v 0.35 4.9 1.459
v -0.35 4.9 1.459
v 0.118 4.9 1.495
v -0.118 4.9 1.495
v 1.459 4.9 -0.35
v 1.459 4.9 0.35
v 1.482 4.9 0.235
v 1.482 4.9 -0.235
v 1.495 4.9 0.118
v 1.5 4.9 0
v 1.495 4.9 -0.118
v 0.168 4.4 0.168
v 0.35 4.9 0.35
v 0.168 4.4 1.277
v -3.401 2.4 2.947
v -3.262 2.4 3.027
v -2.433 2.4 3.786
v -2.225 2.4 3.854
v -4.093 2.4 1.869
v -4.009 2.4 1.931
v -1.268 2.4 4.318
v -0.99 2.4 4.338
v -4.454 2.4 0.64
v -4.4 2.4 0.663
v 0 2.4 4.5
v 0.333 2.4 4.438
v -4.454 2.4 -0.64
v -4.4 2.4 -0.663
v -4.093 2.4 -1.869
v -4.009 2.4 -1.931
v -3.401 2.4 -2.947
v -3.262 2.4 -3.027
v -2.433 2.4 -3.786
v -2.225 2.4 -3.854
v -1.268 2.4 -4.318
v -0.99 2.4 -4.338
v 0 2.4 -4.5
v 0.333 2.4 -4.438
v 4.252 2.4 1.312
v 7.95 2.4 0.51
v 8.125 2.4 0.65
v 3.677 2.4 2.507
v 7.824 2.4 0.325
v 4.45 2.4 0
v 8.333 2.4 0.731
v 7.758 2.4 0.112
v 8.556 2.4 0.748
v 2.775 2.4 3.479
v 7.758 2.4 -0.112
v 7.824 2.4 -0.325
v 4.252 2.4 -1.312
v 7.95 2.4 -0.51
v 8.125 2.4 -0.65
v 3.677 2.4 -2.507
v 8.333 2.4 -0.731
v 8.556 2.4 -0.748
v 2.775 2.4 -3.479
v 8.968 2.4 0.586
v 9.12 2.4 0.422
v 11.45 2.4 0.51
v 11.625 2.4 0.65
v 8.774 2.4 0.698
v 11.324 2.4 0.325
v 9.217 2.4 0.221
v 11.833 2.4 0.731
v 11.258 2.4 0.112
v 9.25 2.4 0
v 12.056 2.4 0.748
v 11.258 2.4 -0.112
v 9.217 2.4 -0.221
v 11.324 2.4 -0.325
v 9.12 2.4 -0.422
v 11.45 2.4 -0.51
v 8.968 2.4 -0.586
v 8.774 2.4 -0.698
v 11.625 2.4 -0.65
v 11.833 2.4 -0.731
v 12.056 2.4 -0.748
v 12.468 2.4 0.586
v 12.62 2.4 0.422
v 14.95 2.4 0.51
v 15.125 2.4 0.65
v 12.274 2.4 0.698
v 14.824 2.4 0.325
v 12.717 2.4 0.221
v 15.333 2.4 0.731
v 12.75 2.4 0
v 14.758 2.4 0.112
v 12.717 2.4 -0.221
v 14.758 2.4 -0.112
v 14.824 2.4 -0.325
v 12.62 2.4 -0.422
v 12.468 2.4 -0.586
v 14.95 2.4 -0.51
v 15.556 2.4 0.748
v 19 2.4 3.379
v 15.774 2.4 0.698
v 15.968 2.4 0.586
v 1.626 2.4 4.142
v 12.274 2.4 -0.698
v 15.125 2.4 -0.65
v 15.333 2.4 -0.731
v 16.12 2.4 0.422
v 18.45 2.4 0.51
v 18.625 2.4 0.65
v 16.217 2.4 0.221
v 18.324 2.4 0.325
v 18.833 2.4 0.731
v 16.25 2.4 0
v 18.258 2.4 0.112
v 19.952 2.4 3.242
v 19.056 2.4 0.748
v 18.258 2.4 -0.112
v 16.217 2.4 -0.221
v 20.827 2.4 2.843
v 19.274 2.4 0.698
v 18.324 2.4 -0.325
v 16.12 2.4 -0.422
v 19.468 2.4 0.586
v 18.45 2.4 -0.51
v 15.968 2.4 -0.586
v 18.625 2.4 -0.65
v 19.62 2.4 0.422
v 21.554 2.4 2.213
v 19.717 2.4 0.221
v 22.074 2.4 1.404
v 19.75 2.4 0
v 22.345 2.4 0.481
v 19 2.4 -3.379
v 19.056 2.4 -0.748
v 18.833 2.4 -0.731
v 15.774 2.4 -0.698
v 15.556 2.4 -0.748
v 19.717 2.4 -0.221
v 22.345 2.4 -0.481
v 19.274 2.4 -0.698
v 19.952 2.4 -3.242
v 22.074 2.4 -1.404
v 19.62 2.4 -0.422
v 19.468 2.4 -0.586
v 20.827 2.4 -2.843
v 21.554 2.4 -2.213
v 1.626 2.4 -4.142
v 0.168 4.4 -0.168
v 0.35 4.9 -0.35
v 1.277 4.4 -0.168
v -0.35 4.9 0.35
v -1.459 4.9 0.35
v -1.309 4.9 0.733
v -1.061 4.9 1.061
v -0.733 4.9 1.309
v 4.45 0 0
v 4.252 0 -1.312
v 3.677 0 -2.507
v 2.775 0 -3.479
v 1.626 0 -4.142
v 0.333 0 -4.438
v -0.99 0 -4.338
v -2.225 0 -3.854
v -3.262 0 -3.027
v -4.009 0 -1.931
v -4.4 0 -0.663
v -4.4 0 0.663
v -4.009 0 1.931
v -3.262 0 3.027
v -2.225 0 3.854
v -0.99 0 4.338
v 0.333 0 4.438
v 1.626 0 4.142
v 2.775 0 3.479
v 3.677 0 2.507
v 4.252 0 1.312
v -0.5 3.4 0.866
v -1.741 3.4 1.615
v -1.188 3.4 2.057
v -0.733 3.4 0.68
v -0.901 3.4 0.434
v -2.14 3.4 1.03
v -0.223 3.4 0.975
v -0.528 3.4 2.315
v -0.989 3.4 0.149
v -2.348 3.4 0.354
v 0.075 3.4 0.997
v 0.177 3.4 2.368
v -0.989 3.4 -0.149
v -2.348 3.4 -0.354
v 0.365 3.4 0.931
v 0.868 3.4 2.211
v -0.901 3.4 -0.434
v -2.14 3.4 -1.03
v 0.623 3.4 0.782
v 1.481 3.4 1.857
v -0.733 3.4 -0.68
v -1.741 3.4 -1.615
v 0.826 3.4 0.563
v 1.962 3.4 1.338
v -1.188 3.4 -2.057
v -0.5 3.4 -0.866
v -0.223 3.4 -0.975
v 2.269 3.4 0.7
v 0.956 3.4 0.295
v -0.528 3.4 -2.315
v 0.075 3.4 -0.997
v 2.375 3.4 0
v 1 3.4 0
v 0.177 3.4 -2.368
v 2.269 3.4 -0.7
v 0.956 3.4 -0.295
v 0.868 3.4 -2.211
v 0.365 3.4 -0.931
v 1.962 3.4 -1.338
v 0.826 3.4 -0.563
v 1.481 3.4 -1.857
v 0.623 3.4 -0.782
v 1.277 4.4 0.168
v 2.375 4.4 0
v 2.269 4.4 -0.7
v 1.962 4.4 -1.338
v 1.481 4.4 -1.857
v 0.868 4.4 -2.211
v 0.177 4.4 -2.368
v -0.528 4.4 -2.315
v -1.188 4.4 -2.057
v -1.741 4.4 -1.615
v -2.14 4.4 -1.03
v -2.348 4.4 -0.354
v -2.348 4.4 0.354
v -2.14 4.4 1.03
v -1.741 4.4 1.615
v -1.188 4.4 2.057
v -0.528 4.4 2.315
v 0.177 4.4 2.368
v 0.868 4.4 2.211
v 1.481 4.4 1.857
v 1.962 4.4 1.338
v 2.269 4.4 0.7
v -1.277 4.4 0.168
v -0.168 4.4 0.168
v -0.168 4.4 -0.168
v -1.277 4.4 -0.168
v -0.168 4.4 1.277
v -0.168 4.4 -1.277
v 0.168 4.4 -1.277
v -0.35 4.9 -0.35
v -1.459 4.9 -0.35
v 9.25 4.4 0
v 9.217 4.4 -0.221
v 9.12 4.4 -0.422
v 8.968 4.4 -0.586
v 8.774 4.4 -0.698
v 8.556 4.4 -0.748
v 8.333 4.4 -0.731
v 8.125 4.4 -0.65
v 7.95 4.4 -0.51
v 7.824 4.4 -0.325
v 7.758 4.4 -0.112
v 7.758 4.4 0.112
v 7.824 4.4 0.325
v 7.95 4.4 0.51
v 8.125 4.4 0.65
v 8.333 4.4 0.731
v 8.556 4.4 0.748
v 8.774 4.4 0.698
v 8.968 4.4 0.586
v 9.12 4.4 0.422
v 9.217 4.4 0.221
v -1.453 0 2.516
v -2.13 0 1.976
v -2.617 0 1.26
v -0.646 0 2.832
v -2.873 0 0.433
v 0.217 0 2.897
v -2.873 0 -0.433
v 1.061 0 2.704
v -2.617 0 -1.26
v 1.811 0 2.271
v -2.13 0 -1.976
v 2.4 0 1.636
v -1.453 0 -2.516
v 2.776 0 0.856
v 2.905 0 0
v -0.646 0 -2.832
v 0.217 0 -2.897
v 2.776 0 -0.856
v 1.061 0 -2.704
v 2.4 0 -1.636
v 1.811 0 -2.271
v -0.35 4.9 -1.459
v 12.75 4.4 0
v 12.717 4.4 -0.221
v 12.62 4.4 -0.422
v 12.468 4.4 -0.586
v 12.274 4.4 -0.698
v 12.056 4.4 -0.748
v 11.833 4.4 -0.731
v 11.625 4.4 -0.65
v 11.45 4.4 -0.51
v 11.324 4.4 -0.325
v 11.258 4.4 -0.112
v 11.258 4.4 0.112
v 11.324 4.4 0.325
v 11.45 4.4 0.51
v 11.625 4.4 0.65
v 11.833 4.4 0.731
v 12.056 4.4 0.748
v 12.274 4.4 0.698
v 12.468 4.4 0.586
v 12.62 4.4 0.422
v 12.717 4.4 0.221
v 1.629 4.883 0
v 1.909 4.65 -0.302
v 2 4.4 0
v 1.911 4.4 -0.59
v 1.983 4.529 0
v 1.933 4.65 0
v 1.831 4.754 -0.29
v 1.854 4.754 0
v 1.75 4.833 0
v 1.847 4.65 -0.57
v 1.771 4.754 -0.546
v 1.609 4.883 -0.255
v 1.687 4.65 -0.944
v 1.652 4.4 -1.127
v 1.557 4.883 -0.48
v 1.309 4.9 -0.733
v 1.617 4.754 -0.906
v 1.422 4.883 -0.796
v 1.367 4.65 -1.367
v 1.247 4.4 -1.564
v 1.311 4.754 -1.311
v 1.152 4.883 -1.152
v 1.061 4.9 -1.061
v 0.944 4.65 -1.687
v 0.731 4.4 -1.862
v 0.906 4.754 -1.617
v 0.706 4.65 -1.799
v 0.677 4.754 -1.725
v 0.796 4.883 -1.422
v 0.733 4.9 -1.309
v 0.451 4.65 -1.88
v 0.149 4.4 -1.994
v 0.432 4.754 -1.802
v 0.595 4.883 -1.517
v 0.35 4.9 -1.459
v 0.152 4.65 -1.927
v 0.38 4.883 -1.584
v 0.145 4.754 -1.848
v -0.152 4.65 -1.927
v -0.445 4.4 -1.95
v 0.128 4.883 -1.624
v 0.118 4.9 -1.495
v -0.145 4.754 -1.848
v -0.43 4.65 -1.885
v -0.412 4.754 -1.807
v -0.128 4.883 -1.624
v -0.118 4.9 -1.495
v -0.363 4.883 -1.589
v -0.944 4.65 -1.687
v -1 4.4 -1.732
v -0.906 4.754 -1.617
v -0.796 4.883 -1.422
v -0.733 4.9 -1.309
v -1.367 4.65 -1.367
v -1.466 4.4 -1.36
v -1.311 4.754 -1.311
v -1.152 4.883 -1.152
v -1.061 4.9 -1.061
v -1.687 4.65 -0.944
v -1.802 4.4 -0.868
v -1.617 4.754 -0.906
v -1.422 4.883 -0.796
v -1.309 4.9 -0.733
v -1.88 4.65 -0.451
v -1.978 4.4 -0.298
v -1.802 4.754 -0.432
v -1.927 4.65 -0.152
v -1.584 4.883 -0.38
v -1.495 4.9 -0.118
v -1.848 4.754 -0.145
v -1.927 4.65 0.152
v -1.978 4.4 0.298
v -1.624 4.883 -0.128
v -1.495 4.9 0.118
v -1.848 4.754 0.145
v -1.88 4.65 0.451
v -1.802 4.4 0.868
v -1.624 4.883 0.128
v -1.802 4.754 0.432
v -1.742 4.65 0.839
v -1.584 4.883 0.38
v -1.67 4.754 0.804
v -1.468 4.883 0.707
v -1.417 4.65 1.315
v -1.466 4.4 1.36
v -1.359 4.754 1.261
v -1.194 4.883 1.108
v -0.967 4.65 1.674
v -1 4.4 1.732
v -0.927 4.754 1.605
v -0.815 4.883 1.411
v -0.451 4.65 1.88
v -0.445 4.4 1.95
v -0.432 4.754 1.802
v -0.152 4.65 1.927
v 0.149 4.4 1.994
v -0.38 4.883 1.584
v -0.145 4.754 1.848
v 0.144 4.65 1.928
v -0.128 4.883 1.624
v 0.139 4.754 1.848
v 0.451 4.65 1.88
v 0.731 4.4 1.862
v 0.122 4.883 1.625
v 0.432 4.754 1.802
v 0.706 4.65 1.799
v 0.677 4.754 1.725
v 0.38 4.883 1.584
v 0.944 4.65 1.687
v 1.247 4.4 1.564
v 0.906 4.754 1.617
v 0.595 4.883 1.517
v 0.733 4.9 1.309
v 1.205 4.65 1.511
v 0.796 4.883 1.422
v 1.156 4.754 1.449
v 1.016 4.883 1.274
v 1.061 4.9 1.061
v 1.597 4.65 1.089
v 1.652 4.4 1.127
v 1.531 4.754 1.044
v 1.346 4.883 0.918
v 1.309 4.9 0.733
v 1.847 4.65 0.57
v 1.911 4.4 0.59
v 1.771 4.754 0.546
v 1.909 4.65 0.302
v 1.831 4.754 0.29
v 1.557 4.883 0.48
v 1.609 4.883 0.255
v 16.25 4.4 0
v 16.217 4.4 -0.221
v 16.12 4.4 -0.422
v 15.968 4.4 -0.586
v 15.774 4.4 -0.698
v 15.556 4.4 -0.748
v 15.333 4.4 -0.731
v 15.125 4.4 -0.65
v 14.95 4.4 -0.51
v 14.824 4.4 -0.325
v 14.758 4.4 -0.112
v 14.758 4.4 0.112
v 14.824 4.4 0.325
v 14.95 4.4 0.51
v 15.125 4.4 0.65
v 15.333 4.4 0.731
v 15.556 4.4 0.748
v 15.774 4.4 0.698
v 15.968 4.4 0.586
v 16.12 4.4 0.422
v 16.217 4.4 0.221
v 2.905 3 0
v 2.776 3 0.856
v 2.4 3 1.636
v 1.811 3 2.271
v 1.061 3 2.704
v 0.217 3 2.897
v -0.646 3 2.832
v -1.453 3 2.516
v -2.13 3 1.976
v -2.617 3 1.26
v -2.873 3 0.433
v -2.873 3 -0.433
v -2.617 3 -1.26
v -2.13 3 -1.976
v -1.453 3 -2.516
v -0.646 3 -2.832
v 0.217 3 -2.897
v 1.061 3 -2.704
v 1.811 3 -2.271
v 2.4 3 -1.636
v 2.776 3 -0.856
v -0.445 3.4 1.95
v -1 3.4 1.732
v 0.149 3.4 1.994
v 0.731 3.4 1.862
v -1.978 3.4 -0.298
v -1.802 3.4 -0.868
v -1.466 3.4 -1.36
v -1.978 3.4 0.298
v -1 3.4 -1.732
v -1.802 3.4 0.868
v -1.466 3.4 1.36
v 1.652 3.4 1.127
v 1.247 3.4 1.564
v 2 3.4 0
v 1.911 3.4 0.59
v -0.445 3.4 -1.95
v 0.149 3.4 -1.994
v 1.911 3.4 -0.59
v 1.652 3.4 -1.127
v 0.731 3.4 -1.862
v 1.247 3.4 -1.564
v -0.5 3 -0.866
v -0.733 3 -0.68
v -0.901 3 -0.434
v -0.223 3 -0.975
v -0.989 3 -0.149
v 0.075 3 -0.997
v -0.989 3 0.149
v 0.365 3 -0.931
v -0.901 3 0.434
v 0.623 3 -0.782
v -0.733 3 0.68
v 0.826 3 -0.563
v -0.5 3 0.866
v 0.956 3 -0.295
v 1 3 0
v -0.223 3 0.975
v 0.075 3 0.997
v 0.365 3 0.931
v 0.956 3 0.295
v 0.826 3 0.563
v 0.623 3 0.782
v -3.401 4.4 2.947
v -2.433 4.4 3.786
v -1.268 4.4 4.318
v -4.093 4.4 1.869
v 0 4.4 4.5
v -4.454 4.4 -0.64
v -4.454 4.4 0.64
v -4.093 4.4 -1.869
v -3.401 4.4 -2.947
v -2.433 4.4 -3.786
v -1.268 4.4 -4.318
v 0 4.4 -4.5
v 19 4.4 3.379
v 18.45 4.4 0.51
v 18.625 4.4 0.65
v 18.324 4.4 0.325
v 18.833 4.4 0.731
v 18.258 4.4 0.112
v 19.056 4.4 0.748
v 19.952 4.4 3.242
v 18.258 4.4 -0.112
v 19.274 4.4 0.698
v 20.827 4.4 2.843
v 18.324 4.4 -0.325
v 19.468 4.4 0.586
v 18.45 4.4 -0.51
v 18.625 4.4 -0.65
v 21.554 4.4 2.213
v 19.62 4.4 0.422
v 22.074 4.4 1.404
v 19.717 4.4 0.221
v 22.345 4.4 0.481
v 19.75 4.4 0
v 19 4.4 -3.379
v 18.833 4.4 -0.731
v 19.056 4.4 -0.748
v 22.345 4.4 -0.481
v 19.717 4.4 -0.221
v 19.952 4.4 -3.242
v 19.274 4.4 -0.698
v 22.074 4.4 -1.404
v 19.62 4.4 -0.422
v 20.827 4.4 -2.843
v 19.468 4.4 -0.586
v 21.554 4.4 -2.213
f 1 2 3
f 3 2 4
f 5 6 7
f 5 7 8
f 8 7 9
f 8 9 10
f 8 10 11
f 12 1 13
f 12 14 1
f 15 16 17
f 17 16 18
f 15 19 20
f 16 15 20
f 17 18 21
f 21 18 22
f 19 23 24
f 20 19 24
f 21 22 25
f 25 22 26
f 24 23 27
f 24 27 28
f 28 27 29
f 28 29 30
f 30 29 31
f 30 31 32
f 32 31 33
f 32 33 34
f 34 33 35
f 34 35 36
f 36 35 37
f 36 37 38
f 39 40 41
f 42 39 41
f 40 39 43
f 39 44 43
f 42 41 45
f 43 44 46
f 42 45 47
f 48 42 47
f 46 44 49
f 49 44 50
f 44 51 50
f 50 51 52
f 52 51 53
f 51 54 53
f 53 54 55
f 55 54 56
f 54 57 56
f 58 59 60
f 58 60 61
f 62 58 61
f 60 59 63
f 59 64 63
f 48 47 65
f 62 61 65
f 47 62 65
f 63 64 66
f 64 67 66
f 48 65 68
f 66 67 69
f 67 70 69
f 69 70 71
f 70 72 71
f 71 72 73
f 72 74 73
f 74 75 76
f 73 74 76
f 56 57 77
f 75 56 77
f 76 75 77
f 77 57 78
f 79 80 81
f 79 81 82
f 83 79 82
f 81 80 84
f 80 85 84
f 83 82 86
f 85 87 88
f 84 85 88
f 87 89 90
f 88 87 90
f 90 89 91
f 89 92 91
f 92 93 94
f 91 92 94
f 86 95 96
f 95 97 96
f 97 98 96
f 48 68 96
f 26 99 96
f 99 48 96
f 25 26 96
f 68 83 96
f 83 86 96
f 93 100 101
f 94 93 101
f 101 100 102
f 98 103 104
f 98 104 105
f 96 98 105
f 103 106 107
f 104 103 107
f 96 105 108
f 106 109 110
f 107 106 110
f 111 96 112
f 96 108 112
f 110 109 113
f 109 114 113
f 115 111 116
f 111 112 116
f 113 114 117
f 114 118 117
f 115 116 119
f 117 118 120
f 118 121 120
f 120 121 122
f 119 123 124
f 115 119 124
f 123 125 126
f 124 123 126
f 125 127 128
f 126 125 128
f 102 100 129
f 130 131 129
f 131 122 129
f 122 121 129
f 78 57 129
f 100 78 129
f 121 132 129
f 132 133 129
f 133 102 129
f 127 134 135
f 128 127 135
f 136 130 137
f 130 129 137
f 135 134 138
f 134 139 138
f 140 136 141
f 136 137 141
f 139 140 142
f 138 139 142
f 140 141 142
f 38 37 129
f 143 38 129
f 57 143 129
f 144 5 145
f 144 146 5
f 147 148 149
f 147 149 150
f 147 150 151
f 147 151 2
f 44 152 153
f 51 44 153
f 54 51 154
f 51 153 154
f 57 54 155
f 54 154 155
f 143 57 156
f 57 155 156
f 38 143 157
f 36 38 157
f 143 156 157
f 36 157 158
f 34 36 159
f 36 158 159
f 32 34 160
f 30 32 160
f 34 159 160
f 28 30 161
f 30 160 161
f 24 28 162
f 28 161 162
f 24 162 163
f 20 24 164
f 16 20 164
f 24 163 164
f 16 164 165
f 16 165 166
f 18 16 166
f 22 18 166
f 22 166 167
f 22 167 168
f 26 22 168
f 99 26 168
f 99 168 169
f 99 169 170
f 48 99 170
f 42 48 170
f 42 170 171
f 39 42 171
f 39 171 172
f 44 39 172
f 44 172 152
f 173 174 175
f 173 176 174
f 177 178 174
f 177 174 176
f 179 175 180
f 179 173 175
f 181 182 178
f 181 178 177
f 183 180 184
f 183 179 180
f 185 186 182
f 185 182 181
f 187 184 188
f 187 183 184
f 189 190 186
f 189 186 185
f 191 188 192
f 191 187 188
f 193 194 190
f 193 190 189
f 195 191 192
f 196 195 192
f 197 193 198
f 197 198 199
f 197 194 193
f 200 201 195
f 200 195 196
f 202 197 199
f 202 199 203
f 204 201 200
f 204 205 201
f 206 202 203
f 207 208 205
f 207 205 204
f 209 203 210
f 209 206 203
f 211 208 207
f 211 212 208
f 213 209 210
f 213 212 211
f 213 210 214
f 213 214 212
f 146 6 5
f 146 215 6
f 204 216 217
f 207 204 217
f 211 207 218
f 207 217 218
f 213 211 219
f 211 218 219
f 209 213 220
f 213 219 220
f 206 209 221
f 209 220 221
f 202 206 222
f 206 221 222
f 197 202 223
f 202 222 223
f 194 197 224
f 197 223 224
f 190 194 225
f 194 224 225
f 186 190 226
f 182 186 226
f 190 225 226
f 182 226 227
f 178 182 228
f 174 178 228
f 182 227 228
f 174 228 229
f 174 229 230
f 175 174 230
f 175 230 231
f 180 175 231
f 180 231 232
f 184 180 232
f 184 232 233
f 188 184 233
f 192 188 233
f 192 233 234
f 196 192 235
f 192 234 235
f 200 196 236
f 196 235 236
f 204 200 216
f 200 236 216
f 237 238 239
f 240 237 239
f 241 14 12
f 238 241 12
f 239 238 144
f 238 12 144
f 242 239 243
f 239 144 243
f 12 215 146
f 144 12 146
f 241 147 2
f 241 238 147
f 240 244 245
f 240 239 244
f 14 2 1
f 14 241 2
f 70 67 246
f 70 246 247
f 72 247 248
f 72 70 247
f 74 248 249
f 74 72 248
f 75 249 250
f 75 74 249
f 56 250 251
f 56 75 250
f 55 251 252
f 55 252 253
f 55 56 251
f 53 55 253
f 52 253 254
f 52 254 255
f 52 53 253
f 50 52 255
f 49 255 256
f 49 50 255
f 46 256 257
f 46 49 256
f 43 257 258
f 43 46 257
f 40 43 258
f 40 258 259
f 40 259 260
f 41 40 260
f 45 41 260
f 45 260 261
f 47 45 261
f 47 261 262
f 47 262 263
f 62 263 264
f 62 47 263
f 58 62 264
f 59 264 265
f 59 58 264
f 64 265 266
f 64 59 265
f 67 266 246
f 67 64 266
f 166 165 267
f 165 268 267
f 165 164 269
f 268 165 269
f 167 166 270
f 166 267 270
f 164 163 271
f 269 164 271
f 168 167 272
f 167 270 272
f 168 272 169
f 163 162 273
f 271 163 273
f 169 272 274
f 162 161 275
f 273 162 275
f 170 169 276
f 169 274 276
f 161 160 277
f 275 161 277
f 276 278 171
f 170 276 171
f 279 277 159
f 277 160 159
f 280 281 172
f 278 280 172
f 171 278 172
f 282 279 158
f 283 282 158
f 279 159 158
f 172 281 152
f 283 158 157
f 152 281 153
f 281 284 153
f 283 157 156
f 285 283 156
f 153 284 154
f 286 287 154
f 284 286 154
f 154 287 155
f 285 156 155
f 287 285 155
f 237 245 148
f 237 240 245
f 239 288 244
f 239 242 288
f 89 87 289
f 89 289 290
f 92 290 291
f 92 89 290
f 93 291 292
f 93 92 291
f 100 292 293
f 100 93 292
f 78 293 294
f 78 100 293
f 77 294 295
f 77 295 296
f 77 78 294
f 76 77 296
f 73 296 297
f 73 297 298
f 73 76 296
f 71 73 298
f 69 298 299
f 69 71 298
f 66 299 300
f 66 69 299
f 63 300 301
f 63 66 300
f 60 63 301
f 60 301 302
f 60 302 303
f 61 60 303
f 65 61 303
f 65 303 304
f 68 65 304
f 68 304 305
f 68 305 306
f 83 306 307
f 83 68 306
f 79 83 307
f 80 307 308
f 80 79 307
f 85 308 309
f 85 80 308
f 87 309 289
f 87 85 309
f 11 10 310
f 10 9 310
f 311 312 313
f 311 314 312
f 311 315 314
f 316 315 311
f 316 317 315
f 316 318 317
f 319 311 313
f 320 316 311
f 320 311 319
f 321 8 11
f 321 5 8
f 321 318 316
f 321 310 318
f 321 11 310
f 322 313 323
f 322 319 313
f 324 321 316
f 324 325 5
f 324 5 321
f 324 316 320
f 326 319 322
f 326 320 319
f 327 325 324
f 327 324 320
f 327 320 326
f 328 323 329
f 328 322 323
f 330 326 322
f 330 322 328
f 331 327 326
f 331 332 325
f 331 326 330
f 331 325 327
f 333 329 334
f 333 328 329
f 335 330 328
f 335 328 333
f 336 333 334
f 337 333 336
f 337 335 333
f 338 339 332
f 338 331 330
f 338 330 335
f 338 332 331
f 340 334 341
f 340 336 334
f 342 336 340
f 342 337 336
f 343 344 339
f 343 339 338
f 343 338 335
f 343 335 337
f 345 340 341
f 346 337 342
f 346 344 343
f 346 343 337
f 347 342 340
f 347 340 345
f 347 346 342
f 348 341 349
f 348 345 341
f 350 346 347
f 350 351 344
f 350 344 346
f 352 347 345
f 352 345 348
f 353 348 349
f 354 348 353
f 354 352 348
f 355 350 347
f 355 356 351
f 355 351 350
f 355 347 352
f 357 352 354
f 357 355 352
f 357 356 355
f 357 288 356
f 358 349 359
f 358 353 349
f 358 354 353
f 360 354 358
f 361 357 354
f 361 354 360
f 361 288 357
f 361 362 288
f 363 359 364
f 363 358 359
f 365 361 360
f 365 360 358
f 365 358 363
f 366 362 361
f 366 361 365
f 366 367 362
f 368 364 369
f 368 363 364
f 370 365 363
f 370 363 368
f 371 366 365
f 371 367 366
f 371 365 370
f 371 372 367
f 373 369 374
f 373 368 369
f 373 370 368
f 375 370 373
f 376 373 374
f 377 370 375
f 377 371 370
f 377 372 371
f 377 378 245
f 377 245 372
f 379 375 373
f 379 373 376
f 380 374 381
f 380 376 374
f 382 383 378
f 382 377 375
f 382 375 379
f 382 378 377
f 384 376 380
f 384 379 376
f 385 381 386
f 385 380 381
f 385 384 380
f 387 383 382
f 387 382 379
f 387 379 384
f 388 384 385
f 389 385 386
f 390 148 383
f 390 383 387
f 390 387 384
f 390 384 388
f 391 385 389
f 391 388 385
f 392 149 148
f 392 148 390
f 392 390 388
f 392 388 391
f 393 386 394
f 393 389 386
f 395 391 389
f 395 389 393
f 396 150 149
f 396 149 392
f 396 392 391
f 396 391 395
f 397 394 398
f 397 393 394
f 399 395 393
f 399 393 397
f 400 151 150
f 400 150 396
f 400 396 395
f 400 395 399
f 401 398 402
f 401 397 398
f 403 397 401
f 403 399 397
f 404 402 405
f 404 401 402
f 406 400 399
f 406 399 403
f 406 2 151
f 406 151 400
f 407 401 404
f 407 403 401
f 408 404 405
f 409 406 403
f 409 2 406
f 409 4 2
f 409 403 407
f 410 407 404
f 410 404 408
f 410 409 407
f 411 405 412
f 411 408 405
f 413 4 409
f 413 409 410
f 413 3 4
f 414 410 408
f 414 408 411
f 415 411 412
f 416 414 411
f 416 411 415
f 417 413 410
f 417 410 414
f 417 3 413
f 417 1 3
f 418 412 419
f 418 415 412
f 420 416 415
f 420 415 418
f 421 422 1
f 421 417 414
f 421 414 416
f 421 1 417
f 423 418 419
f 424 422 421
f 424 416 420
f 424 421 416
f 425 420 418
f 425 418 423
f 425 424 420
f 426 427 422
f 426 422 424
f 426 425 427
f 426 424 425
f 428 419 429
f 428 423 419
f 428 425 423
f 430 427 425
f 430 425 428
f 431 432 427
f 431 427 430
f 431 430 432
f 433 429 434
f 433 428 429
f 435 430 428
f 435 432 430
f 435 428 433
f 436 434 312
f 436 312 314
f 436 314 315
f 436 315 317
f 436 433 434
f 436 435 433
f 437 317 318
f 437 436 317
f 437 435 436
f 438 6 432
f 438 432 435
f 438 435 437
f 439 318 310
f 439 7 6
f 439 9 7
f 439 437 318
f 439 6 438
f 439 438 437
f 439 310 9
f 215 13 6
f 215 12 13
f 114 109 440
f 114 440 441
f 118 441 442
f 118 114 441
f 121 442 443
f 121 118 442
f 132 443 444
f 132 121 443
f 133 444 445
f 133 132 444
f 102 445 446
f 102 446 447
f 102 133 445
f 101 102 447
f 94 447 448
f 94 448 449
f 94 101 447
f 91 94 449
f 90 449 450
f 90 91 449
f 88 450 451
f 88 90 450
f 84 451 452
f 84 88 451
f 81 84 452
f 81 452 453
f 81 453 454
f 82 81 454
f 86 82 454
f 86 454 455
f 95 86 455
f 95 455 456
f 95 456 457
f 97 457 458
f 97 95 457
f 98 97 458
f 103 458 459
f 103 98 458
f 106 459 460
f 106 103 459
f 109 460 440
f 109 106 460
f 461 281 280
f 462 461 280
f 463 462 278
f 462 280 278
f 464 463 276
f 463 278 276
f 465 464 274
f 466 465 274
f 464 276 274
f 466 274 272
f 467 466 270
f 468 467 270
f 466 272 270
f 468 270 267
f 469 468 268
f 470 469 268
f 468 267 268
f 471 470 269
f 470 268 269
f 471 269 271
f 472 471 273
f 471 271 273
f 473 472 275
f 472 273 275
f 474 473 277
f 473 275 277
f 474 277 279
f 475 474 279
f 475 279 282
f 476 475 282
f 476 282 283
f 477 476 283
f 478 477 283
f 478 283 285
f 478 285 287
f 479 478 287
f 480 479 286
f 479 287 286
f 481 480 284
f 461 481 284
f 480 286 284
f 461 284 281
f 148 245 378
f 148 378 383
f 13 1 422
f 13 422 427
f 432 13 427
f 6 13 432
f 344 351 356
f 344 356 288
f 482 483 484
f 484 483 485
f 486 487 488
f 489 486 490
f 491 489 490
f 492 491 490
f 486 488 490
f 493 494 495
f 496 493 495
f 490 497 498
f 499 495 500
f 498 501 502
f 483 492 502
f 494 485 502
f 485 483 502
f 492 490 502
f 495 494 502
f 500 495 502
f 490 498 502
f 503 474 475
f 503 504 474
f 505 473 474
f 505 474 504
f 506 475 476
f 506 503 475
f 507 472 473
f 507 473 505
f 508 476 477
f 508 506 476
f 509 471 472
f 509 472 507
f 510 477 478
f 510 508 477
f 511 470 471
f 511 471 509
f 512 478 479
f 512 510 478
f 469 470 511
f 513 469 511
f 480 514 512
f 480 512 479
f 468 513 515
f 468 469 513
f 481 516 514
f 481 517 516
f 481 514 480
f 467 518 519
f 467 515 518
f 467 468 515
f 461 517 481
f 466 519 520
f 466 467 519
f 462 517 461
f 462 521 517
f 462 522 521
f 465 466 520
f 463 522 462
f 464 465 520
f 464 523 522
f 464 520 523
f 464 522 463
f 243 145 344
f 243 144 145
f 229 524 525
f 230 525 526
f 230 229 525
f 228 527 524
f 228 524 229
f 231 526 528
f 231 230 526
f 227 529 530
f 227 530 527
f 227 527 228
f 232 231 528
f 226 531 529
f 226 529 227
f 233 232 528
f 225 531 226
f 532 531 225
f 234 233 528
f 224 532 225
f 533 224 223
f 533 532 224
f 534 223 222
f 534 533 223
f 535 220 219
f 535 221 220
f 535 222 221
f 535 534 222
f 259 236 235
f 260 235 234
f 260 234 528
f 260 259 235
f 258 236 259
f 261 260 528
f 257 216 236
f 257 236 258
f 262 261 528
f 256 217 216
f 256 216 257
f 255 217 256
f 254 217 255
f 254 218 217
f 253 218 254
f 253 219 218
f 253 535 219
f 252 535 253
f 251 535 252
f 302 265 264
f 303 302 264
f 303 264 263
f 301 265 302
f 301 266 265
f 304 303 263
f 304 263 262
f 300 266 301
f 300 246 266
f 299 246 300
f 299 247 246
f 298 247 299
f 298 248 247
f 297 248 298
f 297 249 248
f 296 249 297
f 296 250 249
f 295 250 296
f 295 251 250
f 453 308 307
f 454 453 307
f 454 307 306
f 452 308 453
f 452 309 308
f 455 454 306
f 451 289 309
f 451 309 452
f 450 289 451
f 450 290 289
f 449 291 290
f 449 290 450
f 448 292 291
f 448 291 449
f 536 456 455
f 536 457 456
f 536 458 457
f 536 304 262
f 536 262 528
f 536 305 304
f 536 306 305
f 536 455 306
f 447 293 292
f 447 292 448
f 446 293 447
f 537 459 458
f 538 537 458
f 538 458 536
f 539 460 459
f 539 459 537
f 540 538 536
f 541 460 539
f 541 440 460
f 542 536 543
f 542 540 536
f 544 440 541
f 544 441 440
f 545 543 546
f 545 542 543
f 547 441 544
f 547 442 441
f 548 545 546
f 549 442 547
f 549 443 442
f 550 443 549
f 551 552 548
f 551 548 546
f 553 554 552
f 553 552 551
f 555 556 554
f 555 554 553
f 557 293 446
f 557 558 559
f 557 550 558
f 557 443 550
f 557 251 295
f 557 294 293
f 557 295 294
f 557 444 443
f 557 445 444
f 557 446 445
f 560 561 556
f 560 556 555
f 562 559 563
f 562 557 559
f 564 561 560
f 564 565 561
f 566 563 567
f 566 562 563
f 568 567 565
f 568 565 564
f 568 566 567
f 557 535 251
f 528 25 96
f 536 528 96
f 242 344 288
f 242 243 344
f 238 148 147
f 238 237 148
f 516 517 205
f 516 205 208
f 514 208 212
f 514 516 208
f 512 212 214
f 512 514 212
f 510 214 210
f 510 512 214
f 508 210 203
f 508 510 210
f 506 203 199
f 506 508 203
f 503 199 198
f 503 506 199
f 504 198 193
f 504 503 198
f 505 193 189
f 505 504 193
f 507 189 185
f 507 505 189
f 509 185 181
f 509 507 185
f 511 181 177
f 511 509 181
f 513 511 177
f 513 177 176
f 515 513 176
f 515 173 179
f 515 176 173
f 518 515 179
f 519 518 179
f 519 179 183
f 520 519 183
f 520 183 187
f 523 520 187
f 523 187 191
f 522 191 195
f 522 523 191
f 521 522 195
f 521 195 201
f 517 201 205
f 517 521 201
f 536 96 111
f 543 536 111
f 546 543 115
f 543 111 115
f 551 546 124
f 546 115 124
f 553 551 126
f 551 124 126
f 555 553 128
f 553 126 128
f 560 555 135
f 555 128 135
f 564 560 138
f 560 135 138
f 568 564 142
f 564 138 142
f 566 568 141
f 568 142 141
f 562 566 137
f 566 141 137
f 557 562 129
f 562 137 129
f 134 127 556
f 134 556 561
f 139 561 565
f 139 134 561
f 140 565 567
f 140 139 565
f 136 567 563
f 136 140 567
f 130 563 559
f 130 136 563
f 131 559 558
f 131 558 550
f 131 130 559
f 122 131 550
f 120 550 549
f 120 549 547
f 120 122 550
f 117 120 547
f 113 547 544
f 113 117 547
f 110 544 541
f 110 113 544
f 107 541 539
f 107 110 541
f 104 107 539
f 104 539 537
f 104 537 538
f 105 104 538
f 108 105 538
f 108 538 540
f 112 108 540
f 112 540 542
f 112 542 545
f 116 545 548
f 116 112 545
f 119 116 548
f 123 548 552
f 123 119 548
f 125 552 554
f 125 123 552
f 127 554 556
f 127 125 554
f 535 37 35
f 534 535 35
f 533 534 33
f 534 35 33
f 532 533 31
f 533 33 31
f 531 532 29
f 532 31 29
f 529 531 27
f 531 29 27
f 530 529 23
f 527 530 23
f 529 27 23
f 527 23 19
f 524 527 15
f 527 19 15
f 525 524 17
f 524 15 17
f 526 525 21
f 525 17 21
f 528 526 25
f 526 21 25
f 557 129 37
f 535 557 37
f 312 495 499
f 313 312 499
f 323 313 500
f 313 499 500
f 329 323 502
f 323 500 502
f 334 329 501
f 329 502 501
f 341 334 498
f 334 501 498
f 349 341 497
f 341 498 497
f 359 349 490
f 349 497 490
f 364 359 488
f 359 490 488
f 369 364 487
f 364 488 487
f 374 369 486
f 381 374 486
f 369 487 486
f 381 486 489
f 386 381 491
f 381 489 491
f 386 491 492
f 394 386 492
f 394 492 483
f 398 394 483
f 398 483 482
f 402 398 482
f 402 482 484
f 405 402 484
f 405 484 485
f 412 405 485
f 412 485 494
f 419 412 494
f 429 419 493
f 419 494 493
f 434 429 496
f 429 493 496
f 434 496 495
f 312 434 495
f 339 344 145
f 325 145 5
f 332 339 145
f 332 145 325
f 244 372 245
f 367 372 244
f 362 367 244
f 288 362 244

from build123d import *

# Parameters (mm, degrees)
SKETCH1_R           = 4.45
SKETCH1_R_2         = 1
BOSS_EXTRUDE1_DEPTH = 4.4
BOSS_EXTRUDE2_START = 2.4
SKETCH1_3_R         = 2.375
SKETCH1_3_R_2       = 1
SKETCH1_3_R_3       = 0.75
SKETCH1_3_R_4       = 4.45
BOSS_EXTRUDE2_DEPTH = 2
CUT_EXTRUDE1_START  = 4.4
SKETCH1_4_R         = 2.375
CUT_EXTRUDE1_DEPTH  = 1
SKETCH2_R           = 2
BOSS_EXTRUDE3_DEPTH = 1.5
FILLET1_R           = 0.5
SKETCH3_W           = 0.7
SKETCH3_H           = 2.91719043
SKETCH3_W_2         = 2.91719043
SKETCH3_H_2         = 0.7
CUT_EXTRUDE2_DEPTH  = 0.5
CUT_EXTRUDE2_TAPER  = 20
SKETCH4_R           = 2.905
CUT_EXTRUDE3_DEPTH  = 3


with BuildPart() as part:
    # Sketch1 → Boss-Extrude1 (new body)
    with BuildSketch(Plane(origin=(0, 0, 0), x_dir=(1, 0, 0), z_dir=(0, 1, 0))):
        Circle(SKETCH1_R)
        Circle(SKETCH1_R_2, mode=Mode.SUBTRACT)
    extrude(amount=BOSS_EXTRUDE1_DEPTH)

    # Sketch1<3> → Boss-Extrude2 (add)
    with BuildSketch(Plane(origin=(0, 0, 0), x_dir=(1, 0, 0), z_dir=(0, 1, 0)).offset(BOSS_EXTRUDE2_START)):
        Circle(SKETCH1_3_R)
        Circle(SKETCH1_3_R_2, mode=Mode.SUBTRACT)
        with BuildLine():
            Line((0, -4.5), (19, -3.379345653))
            ThreePointArc((19, -3.379345653), (22.379345653, 0), (19, 3.379345653))
            Line((19, 3.379345653), (0, 4.5))
            ThreePointArc((0, 4.5), (-4.5, 0), (0, -4.5))
        make_face()
        with Locations((19, 0)):
            Circle(SKETCH1_3_R_3, mode=Mode.SUBTRACT)
        with Locations((15.5, 0)):
            Circle(SKETCH1_3_R_3, mode=Mode.SUBTRACT)
        with Locations((12, 0)):
            Circle(SKETCH1_3_R_3, mode=Mode.SUBTRACT)
        with Locations((8.5, 0)):
            Circle(SKETCH1_3_R_3, mode=Mode.SUBTRACT)
        Circle(SKETCH1_3_R_4, mode=Mode.SUBTRACT)
    extrude(amount=BOSS_EXTRUDE2_DEPTH)

    # Sketch1<4> → Cut-Extrude1 (cut)
    with BuildSketch(Plane(origin=(0, 0, 0), x_dir=(1, 0, 0), z_dir=(0, 1, 0)).offset(CUT_EXTRUDE1_START)):
        Circle(SKETCH1_4_R)
    extrude(amount=-CUT_EXTRUDE1_DEPTH, mode=Mode.SUBTRACT)

    # Sketch4 → Cut-Extrude3 (cut)
    with BuildSketch(Plane.XZ):
        Circle(SKETCH4_R)
    extrude(amount=-CUT_EXTRUDE3_DEPTH, mode=Mode.SUBTRACT)


with BuildPart() as body_2:
    # Sketch2 → Boss-Extrude3 (new body)
    with BuildSketch(Plane(origin=(0, 3.4, 0), x_dir=(1, 0, 0), z_dir=(0, 1, 0))):
        Circle(SKETCH2_R)
    extrude(amount=BOSS_EXTRUDE3_DEPTH)

    # Fillet1
    fillet1_edges = [body_2.edges().sort_by_distance(p)[0] for p in [
        (-2, 4.9, 0),
    ]]
    fillet(fillet1_edges, radius=FILLET1_R)

    # Sketch3 → Cut-Extrude2 (cut)
    with BuildSketch(Plane(origin=(0, 4.9, 0), x_dir=(1, 0, 0), z_dir=(0, 1, 0))):
        Rectangle(SKETCH3_W, SKETCH3_H)
        Rectangle(SKETCH3_W_2, SKETCH3_H_2)
    extrude(amount=-CUT_EXTRUDE2_DEPTH, taper=CUT_EXTRUDE2_TAPER, mode=Mode.SUBTRACT)


solid = Compound([part.part, body_2.part])
